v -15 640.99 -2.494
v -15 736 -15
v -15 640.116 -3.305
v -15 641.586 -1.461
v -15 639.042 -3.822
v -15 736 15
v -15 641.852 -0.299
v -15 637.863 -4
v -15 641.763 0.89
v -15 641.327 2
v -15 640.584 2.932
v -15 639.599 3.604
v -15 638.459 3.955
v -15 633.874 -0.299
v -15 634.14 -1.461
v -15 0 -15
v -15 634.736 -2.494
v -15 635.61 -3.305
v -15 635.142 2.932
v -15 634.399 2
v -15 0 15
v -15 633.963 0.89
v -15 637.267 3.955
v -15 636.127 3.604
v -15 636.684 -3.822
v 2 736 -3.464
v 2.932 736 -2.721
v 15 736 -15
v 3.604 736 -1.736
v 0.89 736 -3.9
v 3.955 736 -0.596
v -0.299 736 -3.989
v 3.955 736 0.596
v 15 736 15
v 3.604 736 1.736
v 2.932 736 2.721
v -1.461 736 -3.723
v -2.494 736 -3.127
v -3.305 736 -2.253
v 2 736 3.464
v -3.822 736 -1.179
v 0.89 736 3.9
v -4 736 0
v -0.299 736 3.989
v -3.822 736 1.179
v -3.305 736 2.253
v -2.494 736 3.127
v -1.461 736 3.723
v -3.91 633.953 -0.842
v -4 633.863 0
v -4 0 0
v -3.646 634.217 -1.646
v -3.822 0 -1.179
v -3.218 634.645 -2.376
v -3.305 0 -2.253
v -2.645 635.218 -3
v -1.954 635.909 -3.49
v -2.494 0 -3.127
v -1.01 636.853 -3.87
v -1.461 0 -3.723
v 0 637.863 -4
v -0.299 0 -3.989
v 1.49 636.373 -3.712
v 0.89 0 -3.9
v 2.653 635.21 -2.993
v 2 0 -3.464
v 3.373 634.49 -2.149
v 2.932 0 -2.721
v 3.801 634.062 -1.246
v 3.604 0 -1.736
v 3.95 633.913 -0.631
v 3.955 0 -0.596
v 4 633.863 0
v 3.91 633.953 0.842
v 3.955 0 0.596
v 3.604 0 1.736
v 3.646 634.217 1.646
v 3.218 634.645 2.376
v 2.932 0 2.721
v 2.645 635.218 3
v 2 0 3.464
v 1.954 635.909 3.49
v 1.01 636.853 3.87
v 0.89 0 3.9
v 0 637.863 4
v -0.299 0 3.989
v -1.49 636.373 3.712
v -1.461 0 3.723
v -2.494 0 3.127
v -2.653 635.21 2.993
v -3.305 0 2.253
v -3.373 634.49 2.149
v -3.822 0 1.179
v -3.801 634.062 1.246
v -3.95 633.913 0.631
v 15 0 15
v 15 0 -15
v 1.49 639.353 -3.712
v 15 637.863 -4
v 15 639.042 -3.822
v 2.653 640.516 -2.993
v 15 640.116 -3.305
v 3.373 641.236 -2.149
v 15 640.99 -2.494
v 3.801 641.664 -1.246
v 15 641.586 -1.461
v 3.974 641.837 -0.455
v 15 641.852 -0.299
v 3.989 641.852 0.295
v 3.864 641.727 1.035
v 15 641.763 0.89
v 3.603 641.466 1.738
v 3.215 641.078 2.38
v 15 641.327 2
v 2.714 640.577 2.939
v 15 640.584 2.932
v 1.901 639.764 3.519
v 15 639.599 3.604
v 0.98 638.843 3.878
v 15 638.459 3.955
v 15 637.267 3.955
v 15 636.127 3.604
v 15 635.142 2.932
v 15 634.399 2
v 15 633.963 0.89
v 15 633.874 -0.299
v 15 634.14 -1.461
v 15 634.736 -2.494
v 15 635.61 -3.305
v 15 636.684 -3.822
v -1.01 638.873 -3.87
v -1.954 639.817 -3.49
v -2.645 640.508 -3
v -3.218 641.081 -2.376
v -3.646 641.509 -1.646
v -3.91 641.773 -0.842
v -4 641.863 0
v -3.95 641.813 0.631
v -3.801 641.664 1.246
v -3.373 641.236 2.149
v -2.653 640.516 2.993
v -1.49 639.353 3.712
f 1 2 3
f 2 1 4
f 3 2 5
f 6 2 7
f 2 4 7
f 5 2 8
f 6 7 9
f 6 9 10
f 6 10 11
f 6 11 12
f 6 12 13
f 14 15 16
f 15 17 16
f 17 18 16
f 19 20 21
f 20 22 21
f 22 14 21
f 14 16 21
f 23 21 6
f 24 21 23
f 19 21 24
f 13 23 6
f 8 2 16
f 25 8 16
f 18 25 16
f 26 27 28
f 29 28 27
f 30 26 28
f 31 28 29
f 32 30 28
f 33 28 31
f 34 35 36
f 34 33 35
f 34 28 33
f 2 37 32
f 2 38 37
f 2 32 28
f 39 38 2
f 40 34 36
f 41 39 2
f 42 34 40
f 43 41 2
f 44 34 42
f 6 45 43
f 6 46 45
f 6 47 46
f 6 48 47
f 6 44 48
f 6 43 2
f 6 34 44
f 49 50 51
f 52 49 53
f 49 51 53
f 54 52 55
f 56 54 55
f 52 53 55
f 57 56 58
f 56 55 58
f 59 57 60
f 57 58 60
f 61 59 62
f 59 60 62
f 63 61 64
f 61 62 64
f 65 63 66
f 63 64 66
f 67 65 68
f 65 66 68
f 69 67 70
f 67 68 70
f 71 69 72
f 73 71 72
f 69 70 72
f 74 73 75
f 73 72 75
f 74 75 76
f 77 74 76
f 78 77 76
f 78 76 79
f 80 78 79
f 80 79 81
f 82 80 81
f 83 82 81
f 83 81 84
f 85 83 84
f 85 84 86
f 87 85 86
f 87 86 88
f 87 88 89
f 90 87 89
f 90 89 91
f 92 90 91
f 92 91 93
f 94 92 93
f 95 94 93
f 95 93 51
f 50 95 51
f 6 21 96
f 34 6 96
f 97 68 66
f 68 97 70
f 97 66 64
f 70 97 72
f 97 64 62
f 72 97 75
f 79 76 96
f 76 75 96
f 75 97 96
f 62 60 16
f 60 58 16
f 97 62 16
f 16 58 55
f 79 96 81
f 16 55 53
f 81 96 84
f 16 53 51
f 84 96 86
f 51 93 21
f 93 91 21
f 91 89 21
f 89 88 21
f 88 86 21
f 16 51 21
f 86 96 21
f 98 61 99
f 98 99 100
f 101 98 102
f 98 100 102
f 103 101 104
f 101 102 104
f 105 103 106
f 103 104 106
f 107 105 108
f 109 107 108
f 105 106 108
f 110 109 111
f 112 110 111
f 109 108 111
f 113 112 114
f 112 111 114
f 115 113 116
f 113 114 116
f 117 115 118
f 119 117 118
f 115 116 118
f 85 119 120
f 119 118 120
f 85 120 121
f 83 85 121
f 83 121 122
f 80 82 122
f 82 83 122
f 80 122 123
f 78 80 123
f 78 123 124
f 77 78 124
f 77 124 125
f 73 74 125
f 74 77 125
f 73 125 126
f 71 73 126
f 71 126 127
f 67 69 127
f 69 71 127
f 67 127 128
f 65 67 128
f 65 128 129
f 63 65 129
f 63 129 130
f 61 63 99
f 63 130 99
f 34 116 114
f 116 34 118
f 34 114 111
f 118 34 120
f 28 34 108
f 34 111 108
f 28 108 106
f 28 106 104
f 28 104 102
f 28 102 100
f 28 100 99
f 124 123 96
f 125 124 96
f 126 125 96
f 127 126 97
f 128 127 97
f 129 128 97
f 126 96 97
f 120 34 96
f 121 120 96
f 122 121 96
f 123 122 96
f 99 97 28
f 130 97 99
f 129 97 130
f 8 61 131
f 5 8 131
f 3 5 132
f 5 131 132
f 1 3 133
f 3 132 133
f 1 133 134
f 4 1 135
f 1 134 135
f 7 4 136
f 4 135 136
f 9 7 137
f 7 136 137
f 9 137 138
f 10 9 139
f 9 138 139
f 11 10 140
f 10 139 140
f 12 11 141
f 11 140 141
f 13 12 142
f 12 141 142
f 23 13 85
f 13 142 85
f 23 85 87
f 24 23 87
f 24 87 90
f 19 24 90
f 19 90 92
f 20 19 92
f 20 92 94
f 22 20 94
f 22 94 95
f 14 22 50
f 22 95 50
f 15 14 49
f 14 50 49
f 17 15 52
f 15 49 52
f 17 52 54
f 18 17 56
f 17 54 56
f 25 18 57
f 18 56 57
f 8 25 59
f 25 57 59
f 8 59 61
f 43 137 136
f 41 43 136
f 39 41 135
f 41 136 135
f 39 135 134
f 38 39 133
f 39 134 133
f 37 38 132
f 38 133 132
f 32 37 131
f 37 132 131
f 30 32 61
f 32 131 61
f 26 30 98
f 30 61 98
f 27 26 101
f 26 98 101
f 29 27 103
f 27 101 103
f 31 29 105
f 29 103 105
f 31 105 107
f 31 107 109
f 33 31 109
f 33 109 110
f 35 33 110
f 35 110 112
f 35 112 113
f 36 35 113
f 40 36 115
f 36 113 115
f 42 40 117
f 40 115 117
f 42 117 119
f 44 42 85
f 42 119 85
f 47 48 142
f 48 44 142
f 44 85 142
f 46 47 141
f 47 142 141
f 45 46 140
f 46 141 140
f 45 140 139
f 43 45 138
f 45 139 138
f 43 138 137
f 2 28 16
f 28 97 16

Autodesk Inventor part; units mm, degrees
ref_plane "YZ Plane" through (0, 0, 0) normal (1, 0, 0) x (0, 1, 0)
ref_plane "XZ Plane" through (0, 0, 0) normal (0, 1, 0) x (-1, 0, 0)
ref_plane "XY Plane" through (0, 0, 0) normal (0, 0, 1) x (1, 0, 0)
sketch "Boceto1" plane through (0, 0, 0) normal (0, 1, 0) x (-1, 0, 0)
  line L0 (15, 15) -> (-15, 15)
  line L1 (-15, 15) -> (-15, -15)
  line L2 (-15, -15) -> (15, -15)
  line L3 (15, -15) -> (15, 15)
  line L4 (15, 15) -> (-15, -15) construction
  circle A0 centre (0, 0) radius 4
  dimension "d0" = 30
  dimension "d1" = 8
extrude "Extrusión1" add sketch "Boceto1" along normal blind 736
sketch "Sketch2" plane through (15, 0, 15) normal (1, 0, 0) x (0, 0, -1)
  line L0 (0, 736) -> (30, 736) projected
  circle A0 centre (15, 637.863) radius 4
  point P0 (15, 0)
  dimension "d5" = 8
extrude "Extrusion2" cut sketch "Sketch2" against normal blind 30
properties part number "P_3030_1500"
